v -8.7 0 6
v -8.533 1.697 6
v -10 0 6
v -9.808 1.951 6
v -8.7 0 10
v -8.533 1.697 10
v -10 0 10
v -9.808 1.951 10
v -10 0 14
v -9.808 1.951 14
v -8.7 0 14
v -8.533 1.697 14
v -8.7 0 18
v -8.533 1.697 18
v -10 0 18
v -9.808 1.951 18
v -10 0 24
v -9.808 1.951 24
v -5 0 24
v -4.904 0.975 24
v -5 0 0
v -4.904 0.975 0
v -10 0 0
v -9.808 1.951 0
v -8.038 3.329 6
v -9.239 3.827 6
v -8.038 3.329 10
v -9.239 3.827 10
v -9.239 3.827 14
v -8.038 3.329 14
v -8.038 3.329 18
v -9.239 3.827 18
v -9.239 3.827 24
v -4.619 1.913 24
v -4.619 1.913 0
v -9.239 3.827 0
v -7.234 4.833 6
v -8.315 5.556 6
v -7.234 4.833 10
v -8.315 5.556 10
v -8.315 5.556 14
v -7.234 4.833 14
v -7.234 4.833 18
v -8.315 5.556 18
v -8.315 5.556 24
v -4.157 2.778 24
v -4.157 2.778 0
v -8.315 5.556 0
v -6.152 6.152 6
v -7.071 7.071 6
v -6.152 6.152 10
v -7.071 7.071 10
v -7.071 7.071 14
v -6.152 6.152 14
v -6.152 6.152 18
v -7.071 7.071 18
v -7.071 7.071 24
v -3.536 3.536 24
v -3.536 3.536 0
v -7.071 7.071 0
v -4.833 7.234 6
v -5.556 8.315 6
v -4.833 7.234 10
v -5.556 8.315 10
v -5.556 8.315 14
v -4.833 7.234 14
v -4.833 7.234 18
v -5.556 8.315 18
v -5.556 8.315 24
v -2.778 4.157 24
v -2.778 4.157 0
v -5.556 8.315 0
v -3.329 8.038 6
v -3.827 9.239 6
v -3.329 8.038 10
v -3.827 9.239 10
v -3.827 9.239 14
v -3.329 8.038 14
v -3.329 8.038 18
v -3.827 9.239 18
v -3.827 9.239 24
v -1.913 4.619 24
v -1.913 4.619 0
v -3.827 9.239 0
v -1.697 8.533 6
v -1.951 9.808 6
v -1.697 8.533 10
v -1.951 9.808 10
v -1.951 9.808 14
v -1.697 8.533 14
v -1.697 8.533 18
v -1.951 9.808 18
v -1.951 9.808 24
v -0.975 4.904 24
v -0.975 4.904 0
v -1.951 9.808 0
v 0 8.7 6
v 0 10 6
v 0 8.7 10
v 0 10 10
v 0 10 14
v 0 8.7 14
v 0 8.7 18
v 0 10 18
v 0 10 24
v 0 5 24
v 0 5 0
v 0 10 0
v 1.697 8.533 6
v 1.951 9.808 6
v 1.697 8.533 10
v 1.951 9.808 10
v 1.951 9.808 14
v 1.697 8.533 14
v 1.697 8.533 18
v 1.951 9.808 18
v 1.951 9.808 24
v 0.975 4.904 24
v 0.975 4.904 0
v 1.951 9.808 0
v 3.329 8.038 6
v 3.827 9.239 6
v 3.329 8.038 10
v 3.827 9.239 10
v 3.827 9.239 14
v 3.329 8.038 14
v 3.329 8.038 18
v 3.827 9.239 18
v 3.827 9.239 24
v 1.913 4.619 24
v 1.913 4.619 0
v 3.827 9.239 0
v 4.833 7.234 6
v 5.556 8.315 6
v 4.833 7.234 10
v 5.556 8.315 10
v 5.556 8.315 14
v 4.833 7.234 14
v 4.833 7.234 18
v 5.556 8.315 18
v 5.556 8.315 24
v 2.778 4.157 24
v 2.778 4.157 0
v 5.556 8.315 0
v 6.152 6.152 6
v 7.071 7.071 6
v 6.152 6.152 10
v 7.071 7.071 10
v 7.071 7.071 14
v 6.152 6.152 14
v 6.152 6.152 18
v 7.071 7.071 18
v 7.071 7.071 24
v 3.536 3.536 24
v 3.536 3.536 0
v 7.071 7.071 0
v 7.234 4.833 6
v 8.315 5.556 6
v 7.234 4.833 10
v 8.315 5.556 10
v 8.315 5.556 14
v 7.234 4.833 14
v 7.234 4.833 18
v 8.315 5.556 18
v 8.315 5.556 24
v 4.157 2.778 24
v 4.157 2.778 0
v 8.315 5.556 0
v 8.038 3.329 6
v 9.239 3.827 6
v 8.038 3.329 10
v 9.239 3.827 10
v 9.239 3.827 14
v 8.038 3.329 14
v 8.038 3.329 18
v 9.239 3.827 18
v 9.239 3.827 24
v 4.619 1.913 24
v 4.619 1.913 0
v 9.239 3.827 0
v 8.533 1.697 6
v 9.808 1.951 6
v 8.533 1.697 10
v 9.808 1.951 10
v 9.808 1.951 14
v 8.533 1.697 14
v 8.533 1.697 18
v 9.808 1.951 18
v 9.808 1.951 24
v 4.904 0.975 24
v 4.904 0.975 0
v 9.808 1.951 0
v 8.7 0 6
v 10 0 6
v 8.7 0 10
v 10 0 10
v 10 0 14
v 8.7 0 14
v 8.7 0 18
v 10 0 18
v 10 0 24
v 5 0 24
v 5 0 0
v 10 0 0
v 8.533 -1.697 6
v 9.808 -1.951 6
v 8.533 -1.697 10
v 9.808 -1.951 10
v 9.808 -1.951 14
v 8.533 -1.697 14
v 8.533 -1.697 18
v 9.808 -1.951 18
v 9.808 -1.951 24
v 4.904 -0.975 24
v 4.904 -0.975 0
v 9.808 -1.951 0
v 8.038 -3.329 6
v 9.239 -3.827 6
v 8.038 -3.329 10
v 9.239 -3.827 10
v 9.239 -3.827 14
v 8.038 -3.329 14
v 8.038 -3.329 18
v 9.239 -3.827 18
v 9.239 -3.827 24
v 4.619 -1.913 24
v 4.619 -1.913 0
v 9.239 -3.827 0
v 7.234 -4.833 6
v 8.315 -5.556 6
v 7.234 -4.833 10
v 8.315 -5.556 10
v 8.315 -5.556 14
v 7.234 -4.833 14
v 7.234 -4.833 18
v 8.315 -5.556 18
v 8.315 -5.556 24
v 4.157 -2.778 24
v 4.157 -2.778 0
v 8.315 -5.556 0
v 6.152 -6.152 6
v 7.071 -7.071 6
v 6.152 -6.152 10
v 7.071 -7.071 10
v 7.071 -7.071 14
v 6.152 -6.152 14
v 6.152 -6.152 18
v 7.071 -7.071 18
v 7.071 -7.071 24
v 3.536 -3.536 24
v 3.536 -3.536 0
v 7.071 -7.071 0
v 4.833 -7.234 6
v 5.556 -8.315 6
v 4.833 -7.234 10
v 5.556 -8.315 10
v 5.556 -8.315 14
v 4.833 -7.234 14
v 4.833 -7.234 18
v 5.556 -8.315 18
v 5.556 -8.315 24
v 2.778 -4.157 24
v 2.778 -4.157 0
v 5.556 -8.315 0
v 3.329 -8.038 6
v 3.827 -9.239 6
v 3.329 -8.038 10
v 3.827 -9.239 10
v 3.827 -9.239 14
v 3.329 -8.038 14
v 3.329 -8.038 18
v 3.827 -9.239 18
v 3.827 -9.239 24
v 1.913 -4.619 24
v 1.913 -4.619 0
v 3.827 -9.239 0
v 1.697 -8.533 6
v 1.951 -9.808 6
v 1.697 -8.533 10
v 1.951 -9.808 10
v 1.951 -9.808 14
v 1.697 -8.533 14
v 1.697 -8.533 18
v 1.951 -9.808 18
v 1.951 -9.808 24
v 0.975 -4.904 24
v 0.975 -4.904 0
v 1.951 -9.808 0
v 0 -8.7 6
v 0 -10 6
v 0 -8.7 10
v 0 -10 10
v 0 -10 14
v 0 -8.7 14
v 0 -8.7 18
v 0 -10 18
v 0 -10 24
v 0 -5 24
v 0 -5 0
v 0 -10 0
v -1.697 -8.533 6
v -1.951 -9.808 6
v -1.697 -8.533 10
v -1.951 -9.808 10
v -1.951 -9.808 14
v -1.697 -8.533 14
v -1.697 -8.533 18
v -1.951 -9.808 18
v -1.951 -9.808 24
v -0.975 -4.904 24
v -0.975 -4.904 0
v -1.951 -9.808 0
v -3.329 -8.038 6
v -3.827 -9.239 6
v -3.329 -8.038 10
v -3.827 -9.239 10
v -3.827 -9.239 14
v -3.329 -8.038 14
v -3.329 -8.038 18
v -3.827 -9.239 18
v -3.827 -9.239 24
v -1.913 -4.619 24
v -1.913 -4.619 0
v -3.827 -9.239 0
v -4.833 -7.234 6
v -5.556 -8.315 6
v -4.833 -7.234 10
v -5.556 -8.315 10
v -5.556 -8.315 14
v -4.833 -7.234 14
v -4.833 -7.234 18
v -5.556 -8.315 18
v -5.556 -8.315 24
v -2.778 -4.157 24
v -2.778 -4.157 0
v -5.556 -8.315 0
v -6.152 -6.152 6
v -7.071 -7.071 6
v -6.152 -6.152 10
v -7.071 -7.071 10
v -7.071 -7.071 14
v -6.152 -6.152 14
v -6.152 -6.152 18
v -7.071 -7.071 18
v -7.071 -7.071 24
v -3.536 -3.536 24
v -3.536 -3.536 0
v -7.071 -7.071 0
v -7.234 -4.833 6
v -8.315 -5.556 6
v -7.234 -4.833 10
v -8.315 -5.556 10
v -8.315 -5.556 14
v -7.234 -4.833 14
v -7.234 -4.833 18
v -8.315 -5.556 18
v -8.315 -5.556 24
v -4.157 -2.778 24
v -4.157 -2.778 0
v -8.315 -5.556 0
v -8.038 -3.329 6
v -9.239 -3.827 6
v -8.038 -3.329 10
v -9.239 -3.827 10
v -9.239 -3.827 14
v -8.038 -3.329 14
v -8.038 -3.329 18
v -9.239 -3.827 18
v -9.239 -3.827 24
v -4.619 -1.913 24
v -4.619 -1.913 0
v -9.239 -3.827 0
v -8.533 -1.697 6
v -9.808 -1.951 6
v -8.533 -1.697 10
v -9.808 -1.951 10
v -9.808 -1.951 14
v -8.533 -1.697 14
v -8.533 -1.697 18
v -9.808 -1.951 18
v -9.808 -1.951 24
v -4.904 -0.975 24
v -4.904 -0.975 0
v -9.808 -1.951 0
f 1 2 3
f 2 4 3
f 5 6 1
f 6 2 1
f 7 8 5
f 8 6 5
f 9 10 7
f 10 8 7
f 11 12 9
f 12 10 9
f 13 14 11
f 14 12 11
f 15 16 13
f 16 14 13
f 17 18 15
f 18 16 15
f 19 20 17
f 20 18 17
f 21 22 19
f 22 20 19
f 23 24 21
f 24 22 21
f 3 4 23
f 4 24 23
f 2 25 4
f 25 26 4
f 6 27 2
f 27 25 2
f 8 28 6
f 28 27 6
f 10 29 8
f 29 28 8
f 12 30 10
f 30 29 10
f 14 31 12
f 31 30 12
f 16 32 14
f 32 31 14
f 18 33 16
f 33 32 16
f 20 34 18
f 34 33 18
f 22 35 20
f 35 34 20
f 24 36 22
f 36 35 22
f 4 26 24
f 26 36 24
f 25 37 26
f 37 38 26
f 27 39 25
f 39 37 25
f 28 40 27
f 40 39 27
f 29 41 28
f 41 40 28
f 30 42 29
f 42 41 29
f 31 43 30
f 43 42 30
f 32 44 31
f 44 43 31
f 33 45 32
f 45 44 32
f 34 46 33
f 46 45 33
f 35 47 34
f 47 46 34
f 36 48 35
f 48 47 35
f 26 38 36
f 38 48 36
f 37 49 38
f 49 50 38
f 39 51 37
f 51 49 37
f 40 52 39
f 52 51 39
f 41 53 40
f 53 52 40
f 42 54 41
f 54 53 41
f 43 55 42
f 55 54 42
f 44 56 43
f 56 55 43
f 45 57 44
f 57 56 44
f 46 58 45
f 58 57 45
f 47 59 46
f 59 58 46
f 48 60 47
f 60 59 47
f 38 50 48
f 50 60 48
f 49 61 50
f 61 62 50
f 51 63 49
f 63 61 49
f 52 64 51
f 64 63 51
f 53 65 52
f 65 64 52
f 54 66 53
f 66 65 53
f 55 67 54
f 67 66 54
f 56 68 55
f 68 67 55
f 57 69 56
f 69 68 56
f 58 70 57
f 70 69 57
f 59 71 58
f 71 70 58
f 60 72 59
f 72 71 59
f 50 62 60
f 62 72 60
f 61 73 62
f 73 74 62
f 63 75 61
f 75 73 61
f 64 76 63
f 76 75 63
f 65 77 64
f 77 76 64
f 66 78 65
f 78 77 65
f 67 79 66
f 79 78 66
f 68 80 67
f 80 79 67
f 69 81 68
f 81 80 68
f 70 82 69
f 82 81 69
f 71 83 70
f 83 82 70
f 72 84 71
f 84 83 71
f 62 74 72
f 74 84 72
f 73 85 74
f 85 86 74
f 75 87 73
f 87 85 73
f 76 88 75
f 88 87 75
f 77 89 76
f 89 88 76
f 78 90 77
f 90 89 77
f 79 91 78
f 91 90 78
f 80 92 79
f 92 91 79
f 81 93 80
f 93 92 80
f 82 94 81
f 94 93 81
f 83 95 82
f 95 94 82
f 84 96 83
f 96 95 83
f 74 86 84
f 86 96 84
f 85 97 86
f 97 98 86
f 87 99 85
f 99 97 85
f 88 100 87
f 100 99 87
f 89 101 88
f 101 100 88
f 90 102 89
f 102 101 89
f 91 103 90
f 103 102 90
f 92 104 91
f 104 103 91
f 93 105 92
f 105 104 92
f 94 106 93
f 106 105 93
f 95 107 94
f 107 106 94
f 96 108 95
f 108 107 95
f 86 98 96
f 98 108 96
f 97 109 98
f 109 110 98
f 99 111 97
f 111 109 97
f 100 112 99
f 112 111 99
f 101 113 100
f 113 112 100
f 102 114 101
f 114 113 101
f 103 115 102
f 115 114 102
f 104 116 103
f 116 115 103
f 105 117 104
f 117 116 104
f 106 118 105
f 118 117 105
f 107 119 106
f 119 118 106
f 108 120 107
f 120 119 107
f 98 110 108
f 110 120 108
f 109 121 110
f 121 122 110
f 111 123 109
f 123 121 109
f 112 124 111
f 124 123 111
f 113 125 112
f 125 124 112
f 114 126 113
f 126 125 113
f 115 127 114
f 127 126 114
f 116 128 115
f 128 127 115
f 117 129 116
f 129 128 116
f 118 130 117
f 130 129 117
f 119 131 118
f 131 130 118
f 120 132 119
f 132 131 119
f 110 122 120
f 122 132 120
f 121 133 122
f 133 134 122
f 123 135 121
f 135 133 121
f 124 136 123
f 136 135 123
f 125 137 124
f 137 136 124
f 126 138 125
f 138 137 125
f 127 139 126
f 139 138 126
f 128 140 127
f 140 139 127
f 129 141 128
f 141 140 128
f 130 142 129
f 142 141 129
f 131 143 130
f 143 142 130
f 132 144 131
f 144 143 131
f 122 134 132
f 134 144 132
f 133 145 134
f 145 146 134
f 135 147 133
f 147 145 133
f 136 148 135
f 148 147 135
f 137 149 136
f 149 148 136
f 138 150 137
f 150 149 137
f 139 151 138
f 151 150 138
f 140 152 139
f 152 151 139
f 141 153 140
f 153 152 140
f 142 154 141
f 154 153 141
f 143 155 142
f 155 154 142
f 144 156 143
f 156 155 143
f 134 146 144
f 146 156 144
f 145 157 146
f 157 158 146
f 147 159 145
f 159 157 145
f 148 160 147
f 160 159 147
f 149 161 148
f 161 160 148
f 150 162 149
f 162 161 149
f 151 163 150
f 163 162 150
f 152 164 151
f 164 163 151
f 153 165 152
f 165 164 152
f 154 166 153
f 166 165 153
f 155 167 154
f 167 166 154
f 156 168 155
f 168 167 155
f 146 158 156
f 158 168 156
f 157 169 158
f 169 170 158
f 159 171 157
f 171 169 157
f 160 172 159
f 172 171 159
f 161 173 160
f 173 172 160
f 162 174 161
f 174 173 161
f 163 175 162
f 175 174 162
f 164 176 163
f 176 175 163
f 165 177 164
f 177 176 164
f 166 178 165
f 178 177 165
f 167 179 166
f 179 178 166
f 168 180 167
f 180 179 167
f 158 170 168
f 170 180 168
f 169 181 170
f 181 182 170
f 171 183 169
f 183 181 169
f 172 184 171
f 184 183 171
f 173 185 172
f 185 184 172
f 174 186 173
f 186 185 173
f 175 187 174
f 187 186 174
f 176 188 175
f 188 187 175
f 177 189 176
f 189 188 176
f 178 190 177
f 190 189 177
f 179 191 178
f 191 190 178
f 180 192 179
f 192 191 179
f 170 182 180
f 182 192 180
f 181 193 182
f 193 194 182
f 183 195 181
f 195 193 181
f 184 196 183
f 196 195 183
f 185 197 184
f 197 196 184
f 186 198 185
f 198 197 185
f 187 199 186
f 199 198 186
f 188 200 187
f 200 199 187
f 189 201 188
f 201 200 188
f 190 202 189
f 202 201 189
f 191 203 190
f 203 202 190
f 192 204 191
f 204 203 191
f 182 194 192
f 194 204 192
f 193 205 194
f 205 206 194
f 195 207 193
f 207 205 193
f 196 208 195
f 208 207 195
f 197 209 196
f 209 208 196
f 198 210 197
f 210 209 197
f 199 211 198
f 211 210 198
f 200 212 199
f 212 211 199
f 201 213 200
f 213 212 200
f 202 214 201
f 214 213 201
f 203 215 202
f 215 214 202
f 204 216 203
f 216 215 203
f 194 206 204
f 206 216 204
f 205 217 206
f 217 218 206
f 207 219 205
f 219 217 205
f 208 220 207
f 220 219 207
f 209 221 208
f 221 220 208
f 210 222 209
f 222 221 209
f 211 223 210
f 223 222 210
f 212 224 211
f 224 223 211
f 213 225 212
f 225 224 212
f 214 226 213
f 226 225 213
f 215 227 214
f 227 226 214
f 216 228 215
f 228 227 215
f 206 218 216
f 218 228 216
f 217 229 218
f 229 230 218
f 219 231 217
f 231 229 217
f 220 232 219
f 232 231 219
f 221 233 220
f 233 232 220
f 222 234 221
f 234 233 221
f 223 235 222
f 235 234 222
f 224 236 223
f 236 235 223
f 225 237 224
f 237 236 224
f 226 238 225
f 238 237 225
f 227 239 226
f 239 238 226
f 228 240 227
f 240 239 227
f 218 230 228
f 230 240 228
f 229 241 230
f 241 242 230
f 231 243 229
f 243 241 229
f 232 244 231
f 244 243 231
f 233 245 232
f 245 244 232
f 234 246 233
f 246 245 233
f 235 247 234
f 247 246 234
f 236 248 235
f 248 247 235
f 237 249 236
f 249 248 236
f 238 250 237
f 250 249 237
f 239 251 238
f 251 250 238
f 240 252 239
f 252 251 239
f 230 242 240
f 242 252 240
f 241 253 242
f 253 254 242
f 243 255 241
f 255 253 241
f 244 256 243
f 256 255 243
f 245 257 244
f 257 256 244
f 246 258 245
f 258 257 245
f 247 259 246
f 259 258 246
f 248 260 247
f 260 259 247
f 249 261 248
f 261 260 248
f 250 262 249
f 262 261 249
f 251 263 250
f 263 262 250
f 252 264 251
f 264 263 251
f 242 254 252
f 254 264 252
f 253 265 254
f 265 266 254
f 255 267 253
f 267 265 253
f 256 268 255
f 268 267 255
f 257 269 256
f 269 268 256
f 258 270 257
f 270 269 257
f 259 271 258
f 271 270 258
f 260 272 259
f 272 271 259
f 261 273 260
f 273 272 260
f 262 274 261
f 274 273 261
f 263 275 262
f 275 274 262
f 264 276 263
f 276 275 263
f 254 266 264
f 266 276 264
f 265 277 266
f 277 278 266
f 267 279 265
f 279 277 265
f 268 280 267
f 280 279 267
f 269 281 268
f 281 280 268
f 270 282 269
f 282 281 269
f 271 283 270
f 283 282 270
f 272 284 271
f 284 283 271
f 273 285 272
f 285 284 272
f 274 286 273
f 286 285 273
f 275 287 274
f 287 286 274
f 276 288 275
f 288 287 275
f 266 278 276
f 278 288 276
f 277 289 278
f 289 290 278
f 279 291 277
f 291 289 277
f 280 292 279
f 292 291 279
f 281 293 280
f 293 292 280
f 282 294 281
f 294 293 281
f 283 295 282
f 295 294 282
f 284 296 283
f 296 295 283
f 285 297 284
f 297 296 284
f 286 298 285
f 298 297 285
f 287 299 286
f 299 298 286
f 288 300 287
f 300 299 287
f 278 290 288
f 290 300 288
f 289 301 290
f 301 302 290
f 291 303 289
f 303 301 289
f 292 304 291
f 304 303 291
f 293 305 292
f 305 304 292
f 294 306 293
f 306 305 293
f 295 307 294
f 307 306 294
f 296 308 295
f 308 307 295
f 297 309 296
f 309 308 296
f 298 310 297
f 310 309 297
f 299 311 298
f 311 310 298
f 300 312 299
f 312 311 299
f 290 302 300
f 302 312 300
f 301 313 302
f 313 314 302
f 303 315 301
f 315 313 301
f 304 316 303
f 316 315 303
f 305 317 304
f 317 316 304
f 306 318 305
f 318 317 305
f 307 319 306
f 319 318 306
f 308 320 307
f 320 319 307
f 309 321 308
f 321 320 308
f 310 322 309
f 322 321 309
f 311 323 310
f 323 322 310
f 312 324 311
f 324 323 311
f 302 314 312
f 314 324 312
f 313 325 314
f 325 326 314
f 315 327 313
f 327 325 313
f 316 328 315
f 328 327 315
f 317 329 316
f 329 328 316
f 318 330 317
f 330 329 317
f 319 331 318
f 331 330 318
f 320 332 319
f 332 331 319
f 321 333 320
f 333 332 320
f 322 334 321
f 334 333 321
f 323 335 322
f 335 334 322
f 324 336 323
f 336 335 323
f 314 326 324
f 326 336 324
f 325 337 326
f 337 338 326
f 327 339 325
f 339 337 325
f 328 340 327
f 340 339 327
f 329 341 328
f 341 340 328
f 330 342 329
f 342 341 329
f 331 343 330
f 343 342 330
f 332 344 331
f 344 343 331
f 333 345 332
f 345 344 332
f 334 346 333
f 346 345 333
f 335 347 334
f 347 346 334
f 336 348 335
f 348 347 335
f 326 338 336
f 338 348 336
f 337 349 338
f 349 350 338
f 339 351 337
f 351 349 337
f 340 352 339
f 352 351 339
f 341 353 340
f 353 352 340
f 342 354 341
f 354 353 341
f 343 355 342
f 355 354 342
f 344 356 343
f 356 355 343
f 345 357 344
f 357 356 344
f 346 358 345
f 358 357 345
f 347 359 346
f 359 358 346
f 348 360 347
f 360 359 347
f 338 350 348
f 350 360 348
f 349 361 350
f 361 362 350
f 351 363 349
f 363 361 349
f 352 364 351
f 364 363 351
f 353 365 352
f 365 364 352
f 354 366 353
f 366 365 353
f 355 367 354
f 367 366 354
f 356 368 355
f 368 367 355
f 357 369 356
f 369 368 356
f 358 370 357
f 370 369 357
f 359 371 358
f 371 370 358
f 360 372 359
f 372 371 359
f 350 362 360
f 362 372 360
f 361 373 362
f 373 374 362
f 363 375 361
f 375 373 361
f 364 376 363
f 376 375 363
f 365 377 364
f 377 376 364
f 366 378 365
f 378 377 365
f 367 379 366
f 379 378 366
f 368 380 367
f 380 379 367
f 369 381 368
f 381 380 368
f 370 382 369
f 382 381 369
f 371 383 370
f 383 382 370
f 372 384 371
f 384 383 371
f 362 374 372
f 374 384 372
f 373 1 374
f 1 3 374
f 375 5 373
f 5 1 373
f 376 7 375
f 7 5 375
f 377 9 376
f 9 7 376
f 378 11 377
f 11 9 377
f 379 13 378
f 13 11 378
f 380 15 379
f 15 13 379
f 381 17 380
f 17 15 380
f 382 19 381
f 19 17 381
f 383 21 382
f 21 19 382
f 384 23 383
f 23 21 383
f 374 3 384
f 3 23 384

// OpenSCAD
$fn = 32;

// ----------------------------------------------------------------------
// Grooved revolve: plain_grooves, bore R5
// ----------------------------------------------------------------------

// --- parameters (mm) ---
bore_r = 5;               // bore radius
outer_r = 10;             // outer radius of the body
total_h = 24;             // overall height, Z
wall = 5;                 // radial wall thickness
groove_w = 4;             // groove width
groove_d = 1.3;           // groove depth
grooves = 2;              // number of outer grooves

bbox_x = 2 * outer_r;  // full diameter
bore_d = 2 * bore_r;  // bore diameter
body_d = 2 * outer_r;  // body diameter
revolve_angle = 360;  // full turn around the Z axis

profile = [[5, 0], [10, 0], [10, 6], [8.7, 6], [8.7, 10], [10, 10], [10, 14], [8.7, 14], [8.7, 18], [10, 18], [10, 24], [5, 24]];  // primary outline, 12 points, counter clockwise

// --- the one profile operation ---
rotate_extrude(angle = revolve_angle) polygon(points = profile);
